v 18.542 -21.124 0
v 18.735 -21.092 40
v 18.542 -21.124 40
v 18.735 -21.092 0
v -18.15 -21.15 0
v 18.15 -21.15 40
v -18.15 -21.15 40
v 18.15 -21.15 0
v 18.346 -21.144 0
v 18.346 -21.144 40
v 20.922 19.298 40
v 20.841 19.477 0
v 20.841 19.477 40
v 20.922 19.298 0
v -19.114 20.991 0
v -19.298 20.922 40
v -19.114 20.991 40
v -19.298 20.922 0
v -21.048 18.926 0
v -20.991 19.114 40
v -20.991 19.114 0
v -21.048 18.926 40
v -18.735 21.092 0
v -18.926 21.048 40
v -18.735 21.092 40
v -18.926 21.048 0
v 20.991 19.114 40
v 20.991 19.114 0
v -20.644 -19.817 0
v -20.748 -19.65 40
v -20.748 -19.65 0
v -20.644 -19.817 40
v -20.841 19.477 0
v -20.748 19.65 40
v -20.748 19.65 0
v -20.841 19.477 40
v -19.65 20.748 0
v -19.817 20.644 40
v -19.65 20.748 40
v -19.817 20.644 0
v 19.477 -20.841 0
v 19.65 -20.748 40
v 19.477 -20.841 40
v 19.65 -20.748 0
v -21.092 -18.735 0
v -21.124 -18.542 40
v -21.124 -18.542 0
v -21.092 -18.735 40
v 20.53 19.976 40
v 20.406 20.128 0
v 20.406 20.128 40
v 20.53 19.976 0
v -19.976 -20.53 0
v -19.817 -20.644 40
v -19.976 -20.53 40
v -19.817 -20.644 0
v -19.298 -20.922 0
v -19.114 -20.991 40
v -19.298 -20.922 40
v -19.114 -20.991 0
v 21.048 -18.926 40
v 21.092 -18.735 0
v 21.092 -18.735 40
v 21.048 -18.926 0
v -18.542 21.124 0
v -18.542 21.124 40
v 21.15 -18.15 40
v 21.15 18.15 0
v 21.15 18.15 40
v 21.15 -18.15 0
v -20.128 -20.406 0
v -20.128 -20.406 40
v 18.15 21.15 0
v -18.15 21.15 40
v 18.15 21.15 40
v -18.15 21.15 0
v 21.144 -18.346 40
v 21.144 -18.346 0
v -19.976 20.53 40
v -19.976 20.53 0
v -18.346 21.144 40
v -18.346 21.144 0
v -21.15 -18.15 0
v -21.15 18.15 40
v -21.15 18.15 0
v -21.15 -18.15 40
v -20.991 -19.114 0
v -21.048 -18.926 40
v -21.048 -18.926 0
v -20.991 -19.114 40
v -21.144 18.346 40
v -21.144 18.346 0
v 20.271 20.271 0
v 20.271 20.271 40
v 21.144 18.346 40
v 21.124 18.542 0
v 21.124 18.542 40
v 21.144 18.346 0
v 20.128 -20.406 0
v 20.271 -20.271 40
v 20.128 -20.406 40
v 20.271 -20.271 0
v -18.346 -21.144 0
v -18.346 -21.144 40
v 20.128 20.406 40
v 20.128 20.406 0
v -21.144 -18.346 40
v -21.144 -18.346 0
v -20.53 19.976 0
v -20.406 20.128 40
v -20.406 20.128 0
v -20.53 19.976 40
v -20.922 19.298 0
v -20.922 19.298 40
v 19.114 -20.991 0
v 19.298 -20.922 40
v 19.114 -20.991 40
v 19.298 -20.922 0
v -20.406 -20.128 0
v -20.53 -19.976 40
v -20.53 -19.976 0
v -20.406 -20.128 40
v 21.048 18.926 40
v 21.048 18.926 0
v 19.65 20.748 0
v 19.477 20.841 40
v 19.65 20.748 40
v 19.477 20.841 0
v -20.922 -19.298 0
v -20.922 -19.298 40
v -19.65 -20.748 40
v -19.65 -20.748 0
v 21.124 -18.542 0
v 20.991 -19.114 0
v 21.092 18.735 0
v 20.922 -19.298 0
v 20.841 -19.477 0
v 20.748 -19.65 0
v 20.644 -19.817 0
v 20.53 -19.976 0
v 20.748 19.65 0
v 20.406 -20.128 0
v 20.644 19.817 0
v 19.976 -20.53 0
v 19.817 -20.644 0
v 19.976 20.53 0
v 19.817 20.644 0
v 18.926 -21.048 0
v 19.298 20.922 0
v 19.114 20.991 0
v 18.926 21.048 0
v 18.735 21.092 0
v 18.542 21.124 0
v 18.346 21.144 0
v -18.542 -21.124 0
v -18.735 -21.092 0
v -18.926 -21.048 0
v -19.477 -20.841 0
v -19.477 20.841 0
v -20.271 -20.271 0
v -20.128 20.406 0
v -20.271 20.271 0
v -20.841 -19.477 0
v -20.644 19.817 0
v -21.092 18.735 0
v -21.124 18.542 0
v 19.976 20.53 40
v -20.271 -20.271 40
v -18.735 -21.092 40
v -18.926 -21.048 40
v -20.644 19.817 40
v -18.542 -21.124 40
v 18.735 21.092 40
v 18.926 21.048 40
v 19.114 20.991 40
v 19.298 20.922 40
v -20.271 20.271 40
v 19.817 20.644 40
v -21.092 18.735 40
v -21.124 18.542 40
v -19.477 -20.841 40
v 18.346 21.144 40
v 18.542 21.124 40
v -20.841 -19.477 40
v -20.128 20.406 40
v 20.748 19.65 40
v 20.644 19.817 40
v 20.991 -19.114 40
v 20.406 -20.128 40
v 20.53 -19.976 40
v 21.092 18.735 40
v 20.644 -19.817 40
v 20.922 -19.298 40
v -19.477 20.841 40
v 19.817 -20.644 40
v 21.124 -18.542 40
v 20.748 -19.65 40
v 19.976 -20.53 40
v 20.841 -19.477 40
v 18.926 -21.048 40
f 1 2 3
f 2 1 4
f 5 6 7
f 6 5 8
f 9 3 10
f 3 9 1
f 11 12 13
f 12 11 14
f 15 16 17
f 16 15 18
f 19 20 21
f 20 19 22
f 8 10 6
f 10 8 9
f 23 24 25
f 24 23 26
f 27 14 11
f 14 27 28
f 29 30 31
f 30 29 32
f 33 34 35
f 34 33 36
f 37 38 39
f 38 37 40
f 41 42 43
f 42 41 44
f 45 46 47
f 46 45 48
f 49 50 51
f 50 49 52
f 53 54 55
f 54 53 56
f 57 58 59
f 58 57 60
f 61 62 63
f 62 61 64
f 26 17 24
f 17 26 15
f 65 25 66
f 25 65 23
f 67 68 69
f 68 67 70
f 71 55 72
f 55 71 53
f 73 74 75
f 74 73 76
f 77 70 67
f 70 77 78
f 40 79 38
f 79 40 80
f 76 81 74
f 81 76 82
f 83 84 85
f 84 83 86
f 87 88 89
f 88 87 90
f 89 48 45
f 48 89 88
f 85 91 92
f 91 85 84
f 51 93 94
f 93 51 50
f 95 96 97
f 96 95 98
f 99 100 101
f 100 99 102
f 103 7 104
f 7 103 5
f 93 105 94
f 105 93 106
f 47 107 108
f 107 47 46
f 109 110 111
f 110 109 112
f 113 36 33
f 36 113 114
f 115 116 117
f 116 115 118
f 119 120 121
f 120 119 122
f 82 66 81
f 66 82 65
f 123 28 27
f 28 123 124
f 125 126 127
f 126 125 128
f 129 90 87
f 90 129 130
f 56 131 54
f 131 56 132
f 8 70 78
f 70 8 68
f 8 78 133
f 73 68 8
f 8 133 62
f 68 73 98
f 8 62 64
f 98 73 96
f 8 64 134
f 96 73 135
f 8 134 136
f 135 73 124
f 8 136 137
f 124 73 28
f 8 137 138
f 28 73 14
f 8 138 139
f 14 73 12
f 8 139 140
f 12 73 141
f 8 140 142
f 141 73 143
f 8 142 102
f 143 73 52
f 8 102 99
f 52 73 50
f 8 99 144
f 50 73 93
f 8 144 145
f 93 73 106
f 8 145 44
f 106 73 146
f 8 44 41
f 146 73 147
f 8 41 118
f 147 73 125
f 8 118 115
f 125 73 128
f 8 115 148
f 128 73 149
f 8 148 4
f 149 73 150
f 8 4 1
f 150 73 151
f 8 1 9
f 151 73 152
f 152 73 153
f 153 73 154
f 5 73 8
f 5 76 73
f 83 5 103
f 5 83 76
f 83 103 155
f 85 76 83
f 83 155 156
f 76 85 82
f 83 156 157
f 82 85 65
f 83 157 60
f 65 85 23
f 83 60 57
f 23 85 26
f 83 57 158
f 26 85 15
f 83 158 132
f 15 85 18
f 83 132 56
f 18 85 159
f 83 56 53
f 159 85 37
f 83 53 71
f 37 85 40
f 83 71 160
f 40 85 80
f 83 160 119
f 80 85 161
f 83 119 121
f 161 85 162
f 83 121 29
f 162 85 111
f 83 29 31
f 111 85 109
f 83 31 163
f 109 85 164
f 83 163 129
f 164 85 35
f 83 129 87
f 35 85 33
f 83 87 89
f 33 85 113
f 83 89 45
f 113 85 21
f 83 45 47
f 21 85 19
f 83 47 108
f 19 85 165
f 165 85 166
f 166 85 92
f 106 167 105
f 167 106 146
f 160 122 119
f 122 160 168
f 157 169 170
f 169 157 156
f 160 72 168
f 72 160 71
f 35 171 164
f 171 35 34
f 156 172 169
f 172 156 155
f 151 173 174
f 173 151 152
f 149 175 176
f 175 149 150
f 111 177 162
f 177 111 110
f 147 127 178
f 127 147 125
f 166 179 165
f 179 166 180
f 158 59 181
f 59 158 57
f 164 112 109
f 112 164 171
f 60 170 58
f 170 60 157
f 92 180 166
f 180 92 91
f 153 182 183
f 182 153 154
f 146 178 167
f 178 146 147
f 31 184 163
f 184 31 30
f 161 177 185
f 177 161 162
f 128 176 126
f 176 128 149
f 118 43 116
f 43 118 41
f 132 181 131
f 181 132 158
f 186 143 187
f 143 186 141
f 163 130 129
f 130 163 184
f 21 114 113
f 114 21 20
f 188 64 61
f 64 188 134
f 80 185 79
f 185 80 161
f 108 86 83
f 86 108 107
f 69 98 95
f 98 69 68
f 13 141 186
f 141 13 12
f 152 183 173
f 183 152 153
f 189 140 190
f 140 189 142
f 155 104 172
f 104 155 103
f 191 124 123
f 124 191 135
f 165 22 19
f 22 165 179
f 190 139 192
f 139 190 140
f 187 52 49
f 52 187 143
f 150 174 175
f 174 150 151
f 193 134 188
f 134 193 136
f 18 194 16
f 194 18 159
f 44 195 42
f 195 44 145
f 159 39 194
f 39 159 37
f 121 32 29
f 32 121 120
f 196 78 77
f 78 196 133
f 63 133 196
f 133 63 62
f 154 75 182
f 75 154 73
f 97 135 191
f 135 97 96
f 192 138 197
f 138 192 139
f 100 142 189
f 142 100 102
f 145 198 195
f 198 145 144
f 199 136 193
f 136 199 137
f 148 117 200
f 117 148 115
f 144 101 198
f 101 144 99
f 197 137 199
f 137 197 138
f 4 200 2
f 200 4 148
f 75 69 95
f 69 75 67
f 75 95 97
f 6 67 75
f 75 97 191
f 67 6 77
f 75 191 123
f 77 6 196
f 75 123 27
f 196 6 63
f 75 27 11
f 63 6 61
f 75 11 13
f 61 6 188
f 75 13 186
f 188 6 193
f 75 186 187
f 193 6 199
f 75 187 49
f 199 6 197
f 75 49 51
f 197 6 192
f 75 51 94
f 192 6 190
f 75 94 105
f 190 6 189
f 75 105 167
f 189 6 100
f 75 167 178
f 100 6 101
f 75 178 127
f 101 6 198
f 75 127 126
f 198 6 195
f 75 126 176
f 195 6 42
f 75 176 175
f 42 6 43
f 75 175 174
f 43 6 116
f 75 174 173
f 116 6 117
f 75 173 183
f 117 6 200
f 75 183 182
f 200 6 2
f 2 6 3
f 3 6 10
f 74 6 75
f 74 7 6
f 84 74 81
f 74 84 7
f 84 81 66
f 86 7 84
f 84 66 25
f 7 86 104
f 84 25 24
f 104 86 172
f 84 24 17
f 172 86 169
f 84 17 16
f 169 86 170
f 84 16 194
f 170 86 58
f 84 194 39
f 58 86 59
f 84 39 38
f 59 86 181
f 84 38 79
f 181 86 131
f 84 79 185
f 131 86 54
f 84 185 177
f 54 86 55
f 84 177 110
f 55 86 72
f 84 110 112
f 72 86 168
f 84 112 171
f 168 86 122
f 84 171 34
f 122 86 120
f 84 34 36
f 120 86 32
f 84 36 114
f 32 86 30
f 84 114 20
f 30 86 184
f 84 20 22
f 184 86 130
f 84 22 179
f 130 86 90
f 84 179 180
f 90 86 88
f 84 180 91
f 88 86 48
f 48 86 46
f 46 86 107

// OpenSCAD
$fn = 96;

// Parameters (mm)
face_w = 42.3;          // square face width
body_len = 40.0;        // motor body length (excluding front boss/shaft)
shaft_d = 8.0;          // shaft diameter
shaft_len = 22.0;       // typical protrusion
mount_spacing = 31.0;   // hole center-to-center spacing
mount_hole_d = 3.2;     // typical for M3 clearance
front_boss_d = 22.0;    // typical NEMA17 pilot
front_boss_h = 2.0;     // typical pilot height
corner_r = 3.0;         // rounded corners (approx)
face_th = 3.0;          // front face plate thickness (visual)
back_cap_th = 2.0;      // back cap thickness (visual)

module rounded_square_2d(w, r){
    // Rounded rectangle centered at origin
    offset(r=r) offset(delta=-r)
        square([w, w], center=true);
}

module motor_body(){
    // Main body with rounded corners
    color([0.25,0.25,0.27])
    linear_extrude(height=body_len)
        rounded_square_2d(face_w, corner_r);
}

module front_face_features(){
    // Front face plate (slight visual step)
    color([0.20,0.20,0.22])
    translate([0,0,0])
    linear_extrude(height=face_th)
        rounded_square_2d(face_w, corner_r);

    // Front boss/pilot
    color([0.65,0.65,0.68])
    translate([0,0,face_th])
        cylinder(d=front_boss_d, h=front_boss_h);

    // Shaft
    color([0.75,0.75,0.78])
    translate([0,0,face_th + front_boss_h])
        cylinder(d=shaft_d, h=shaft_len);
}

module mounting_holes(){
    // Through holes in the front face region (visual)
    for (sx = [-1,1], sy = [-1,1]){
        translate([sx*mount_spacing/2, sy*mount_spacing/2, -0.1])
            cylinder(d=mount_hole_d, h=face_th + front_boss_h + 0.2);
    }
}

module back_cap(){
    // Slight back cap step
    color([0.18,0.18,0.20])
    translate([0,0,body_len - back_cap_th])
        linear_extrude(height=back_cap_th)
            rounded_square_2d(face_w, corner_r);
}

module stepper_motor(){
    // Body
    motor_body();

    // Back cap
    back_cap();

    // Front face + boss + shaft, with mounting holes cut
    difference(){
        front_face_features();
        mounting_holes();
    }
}

stepper_motor();
